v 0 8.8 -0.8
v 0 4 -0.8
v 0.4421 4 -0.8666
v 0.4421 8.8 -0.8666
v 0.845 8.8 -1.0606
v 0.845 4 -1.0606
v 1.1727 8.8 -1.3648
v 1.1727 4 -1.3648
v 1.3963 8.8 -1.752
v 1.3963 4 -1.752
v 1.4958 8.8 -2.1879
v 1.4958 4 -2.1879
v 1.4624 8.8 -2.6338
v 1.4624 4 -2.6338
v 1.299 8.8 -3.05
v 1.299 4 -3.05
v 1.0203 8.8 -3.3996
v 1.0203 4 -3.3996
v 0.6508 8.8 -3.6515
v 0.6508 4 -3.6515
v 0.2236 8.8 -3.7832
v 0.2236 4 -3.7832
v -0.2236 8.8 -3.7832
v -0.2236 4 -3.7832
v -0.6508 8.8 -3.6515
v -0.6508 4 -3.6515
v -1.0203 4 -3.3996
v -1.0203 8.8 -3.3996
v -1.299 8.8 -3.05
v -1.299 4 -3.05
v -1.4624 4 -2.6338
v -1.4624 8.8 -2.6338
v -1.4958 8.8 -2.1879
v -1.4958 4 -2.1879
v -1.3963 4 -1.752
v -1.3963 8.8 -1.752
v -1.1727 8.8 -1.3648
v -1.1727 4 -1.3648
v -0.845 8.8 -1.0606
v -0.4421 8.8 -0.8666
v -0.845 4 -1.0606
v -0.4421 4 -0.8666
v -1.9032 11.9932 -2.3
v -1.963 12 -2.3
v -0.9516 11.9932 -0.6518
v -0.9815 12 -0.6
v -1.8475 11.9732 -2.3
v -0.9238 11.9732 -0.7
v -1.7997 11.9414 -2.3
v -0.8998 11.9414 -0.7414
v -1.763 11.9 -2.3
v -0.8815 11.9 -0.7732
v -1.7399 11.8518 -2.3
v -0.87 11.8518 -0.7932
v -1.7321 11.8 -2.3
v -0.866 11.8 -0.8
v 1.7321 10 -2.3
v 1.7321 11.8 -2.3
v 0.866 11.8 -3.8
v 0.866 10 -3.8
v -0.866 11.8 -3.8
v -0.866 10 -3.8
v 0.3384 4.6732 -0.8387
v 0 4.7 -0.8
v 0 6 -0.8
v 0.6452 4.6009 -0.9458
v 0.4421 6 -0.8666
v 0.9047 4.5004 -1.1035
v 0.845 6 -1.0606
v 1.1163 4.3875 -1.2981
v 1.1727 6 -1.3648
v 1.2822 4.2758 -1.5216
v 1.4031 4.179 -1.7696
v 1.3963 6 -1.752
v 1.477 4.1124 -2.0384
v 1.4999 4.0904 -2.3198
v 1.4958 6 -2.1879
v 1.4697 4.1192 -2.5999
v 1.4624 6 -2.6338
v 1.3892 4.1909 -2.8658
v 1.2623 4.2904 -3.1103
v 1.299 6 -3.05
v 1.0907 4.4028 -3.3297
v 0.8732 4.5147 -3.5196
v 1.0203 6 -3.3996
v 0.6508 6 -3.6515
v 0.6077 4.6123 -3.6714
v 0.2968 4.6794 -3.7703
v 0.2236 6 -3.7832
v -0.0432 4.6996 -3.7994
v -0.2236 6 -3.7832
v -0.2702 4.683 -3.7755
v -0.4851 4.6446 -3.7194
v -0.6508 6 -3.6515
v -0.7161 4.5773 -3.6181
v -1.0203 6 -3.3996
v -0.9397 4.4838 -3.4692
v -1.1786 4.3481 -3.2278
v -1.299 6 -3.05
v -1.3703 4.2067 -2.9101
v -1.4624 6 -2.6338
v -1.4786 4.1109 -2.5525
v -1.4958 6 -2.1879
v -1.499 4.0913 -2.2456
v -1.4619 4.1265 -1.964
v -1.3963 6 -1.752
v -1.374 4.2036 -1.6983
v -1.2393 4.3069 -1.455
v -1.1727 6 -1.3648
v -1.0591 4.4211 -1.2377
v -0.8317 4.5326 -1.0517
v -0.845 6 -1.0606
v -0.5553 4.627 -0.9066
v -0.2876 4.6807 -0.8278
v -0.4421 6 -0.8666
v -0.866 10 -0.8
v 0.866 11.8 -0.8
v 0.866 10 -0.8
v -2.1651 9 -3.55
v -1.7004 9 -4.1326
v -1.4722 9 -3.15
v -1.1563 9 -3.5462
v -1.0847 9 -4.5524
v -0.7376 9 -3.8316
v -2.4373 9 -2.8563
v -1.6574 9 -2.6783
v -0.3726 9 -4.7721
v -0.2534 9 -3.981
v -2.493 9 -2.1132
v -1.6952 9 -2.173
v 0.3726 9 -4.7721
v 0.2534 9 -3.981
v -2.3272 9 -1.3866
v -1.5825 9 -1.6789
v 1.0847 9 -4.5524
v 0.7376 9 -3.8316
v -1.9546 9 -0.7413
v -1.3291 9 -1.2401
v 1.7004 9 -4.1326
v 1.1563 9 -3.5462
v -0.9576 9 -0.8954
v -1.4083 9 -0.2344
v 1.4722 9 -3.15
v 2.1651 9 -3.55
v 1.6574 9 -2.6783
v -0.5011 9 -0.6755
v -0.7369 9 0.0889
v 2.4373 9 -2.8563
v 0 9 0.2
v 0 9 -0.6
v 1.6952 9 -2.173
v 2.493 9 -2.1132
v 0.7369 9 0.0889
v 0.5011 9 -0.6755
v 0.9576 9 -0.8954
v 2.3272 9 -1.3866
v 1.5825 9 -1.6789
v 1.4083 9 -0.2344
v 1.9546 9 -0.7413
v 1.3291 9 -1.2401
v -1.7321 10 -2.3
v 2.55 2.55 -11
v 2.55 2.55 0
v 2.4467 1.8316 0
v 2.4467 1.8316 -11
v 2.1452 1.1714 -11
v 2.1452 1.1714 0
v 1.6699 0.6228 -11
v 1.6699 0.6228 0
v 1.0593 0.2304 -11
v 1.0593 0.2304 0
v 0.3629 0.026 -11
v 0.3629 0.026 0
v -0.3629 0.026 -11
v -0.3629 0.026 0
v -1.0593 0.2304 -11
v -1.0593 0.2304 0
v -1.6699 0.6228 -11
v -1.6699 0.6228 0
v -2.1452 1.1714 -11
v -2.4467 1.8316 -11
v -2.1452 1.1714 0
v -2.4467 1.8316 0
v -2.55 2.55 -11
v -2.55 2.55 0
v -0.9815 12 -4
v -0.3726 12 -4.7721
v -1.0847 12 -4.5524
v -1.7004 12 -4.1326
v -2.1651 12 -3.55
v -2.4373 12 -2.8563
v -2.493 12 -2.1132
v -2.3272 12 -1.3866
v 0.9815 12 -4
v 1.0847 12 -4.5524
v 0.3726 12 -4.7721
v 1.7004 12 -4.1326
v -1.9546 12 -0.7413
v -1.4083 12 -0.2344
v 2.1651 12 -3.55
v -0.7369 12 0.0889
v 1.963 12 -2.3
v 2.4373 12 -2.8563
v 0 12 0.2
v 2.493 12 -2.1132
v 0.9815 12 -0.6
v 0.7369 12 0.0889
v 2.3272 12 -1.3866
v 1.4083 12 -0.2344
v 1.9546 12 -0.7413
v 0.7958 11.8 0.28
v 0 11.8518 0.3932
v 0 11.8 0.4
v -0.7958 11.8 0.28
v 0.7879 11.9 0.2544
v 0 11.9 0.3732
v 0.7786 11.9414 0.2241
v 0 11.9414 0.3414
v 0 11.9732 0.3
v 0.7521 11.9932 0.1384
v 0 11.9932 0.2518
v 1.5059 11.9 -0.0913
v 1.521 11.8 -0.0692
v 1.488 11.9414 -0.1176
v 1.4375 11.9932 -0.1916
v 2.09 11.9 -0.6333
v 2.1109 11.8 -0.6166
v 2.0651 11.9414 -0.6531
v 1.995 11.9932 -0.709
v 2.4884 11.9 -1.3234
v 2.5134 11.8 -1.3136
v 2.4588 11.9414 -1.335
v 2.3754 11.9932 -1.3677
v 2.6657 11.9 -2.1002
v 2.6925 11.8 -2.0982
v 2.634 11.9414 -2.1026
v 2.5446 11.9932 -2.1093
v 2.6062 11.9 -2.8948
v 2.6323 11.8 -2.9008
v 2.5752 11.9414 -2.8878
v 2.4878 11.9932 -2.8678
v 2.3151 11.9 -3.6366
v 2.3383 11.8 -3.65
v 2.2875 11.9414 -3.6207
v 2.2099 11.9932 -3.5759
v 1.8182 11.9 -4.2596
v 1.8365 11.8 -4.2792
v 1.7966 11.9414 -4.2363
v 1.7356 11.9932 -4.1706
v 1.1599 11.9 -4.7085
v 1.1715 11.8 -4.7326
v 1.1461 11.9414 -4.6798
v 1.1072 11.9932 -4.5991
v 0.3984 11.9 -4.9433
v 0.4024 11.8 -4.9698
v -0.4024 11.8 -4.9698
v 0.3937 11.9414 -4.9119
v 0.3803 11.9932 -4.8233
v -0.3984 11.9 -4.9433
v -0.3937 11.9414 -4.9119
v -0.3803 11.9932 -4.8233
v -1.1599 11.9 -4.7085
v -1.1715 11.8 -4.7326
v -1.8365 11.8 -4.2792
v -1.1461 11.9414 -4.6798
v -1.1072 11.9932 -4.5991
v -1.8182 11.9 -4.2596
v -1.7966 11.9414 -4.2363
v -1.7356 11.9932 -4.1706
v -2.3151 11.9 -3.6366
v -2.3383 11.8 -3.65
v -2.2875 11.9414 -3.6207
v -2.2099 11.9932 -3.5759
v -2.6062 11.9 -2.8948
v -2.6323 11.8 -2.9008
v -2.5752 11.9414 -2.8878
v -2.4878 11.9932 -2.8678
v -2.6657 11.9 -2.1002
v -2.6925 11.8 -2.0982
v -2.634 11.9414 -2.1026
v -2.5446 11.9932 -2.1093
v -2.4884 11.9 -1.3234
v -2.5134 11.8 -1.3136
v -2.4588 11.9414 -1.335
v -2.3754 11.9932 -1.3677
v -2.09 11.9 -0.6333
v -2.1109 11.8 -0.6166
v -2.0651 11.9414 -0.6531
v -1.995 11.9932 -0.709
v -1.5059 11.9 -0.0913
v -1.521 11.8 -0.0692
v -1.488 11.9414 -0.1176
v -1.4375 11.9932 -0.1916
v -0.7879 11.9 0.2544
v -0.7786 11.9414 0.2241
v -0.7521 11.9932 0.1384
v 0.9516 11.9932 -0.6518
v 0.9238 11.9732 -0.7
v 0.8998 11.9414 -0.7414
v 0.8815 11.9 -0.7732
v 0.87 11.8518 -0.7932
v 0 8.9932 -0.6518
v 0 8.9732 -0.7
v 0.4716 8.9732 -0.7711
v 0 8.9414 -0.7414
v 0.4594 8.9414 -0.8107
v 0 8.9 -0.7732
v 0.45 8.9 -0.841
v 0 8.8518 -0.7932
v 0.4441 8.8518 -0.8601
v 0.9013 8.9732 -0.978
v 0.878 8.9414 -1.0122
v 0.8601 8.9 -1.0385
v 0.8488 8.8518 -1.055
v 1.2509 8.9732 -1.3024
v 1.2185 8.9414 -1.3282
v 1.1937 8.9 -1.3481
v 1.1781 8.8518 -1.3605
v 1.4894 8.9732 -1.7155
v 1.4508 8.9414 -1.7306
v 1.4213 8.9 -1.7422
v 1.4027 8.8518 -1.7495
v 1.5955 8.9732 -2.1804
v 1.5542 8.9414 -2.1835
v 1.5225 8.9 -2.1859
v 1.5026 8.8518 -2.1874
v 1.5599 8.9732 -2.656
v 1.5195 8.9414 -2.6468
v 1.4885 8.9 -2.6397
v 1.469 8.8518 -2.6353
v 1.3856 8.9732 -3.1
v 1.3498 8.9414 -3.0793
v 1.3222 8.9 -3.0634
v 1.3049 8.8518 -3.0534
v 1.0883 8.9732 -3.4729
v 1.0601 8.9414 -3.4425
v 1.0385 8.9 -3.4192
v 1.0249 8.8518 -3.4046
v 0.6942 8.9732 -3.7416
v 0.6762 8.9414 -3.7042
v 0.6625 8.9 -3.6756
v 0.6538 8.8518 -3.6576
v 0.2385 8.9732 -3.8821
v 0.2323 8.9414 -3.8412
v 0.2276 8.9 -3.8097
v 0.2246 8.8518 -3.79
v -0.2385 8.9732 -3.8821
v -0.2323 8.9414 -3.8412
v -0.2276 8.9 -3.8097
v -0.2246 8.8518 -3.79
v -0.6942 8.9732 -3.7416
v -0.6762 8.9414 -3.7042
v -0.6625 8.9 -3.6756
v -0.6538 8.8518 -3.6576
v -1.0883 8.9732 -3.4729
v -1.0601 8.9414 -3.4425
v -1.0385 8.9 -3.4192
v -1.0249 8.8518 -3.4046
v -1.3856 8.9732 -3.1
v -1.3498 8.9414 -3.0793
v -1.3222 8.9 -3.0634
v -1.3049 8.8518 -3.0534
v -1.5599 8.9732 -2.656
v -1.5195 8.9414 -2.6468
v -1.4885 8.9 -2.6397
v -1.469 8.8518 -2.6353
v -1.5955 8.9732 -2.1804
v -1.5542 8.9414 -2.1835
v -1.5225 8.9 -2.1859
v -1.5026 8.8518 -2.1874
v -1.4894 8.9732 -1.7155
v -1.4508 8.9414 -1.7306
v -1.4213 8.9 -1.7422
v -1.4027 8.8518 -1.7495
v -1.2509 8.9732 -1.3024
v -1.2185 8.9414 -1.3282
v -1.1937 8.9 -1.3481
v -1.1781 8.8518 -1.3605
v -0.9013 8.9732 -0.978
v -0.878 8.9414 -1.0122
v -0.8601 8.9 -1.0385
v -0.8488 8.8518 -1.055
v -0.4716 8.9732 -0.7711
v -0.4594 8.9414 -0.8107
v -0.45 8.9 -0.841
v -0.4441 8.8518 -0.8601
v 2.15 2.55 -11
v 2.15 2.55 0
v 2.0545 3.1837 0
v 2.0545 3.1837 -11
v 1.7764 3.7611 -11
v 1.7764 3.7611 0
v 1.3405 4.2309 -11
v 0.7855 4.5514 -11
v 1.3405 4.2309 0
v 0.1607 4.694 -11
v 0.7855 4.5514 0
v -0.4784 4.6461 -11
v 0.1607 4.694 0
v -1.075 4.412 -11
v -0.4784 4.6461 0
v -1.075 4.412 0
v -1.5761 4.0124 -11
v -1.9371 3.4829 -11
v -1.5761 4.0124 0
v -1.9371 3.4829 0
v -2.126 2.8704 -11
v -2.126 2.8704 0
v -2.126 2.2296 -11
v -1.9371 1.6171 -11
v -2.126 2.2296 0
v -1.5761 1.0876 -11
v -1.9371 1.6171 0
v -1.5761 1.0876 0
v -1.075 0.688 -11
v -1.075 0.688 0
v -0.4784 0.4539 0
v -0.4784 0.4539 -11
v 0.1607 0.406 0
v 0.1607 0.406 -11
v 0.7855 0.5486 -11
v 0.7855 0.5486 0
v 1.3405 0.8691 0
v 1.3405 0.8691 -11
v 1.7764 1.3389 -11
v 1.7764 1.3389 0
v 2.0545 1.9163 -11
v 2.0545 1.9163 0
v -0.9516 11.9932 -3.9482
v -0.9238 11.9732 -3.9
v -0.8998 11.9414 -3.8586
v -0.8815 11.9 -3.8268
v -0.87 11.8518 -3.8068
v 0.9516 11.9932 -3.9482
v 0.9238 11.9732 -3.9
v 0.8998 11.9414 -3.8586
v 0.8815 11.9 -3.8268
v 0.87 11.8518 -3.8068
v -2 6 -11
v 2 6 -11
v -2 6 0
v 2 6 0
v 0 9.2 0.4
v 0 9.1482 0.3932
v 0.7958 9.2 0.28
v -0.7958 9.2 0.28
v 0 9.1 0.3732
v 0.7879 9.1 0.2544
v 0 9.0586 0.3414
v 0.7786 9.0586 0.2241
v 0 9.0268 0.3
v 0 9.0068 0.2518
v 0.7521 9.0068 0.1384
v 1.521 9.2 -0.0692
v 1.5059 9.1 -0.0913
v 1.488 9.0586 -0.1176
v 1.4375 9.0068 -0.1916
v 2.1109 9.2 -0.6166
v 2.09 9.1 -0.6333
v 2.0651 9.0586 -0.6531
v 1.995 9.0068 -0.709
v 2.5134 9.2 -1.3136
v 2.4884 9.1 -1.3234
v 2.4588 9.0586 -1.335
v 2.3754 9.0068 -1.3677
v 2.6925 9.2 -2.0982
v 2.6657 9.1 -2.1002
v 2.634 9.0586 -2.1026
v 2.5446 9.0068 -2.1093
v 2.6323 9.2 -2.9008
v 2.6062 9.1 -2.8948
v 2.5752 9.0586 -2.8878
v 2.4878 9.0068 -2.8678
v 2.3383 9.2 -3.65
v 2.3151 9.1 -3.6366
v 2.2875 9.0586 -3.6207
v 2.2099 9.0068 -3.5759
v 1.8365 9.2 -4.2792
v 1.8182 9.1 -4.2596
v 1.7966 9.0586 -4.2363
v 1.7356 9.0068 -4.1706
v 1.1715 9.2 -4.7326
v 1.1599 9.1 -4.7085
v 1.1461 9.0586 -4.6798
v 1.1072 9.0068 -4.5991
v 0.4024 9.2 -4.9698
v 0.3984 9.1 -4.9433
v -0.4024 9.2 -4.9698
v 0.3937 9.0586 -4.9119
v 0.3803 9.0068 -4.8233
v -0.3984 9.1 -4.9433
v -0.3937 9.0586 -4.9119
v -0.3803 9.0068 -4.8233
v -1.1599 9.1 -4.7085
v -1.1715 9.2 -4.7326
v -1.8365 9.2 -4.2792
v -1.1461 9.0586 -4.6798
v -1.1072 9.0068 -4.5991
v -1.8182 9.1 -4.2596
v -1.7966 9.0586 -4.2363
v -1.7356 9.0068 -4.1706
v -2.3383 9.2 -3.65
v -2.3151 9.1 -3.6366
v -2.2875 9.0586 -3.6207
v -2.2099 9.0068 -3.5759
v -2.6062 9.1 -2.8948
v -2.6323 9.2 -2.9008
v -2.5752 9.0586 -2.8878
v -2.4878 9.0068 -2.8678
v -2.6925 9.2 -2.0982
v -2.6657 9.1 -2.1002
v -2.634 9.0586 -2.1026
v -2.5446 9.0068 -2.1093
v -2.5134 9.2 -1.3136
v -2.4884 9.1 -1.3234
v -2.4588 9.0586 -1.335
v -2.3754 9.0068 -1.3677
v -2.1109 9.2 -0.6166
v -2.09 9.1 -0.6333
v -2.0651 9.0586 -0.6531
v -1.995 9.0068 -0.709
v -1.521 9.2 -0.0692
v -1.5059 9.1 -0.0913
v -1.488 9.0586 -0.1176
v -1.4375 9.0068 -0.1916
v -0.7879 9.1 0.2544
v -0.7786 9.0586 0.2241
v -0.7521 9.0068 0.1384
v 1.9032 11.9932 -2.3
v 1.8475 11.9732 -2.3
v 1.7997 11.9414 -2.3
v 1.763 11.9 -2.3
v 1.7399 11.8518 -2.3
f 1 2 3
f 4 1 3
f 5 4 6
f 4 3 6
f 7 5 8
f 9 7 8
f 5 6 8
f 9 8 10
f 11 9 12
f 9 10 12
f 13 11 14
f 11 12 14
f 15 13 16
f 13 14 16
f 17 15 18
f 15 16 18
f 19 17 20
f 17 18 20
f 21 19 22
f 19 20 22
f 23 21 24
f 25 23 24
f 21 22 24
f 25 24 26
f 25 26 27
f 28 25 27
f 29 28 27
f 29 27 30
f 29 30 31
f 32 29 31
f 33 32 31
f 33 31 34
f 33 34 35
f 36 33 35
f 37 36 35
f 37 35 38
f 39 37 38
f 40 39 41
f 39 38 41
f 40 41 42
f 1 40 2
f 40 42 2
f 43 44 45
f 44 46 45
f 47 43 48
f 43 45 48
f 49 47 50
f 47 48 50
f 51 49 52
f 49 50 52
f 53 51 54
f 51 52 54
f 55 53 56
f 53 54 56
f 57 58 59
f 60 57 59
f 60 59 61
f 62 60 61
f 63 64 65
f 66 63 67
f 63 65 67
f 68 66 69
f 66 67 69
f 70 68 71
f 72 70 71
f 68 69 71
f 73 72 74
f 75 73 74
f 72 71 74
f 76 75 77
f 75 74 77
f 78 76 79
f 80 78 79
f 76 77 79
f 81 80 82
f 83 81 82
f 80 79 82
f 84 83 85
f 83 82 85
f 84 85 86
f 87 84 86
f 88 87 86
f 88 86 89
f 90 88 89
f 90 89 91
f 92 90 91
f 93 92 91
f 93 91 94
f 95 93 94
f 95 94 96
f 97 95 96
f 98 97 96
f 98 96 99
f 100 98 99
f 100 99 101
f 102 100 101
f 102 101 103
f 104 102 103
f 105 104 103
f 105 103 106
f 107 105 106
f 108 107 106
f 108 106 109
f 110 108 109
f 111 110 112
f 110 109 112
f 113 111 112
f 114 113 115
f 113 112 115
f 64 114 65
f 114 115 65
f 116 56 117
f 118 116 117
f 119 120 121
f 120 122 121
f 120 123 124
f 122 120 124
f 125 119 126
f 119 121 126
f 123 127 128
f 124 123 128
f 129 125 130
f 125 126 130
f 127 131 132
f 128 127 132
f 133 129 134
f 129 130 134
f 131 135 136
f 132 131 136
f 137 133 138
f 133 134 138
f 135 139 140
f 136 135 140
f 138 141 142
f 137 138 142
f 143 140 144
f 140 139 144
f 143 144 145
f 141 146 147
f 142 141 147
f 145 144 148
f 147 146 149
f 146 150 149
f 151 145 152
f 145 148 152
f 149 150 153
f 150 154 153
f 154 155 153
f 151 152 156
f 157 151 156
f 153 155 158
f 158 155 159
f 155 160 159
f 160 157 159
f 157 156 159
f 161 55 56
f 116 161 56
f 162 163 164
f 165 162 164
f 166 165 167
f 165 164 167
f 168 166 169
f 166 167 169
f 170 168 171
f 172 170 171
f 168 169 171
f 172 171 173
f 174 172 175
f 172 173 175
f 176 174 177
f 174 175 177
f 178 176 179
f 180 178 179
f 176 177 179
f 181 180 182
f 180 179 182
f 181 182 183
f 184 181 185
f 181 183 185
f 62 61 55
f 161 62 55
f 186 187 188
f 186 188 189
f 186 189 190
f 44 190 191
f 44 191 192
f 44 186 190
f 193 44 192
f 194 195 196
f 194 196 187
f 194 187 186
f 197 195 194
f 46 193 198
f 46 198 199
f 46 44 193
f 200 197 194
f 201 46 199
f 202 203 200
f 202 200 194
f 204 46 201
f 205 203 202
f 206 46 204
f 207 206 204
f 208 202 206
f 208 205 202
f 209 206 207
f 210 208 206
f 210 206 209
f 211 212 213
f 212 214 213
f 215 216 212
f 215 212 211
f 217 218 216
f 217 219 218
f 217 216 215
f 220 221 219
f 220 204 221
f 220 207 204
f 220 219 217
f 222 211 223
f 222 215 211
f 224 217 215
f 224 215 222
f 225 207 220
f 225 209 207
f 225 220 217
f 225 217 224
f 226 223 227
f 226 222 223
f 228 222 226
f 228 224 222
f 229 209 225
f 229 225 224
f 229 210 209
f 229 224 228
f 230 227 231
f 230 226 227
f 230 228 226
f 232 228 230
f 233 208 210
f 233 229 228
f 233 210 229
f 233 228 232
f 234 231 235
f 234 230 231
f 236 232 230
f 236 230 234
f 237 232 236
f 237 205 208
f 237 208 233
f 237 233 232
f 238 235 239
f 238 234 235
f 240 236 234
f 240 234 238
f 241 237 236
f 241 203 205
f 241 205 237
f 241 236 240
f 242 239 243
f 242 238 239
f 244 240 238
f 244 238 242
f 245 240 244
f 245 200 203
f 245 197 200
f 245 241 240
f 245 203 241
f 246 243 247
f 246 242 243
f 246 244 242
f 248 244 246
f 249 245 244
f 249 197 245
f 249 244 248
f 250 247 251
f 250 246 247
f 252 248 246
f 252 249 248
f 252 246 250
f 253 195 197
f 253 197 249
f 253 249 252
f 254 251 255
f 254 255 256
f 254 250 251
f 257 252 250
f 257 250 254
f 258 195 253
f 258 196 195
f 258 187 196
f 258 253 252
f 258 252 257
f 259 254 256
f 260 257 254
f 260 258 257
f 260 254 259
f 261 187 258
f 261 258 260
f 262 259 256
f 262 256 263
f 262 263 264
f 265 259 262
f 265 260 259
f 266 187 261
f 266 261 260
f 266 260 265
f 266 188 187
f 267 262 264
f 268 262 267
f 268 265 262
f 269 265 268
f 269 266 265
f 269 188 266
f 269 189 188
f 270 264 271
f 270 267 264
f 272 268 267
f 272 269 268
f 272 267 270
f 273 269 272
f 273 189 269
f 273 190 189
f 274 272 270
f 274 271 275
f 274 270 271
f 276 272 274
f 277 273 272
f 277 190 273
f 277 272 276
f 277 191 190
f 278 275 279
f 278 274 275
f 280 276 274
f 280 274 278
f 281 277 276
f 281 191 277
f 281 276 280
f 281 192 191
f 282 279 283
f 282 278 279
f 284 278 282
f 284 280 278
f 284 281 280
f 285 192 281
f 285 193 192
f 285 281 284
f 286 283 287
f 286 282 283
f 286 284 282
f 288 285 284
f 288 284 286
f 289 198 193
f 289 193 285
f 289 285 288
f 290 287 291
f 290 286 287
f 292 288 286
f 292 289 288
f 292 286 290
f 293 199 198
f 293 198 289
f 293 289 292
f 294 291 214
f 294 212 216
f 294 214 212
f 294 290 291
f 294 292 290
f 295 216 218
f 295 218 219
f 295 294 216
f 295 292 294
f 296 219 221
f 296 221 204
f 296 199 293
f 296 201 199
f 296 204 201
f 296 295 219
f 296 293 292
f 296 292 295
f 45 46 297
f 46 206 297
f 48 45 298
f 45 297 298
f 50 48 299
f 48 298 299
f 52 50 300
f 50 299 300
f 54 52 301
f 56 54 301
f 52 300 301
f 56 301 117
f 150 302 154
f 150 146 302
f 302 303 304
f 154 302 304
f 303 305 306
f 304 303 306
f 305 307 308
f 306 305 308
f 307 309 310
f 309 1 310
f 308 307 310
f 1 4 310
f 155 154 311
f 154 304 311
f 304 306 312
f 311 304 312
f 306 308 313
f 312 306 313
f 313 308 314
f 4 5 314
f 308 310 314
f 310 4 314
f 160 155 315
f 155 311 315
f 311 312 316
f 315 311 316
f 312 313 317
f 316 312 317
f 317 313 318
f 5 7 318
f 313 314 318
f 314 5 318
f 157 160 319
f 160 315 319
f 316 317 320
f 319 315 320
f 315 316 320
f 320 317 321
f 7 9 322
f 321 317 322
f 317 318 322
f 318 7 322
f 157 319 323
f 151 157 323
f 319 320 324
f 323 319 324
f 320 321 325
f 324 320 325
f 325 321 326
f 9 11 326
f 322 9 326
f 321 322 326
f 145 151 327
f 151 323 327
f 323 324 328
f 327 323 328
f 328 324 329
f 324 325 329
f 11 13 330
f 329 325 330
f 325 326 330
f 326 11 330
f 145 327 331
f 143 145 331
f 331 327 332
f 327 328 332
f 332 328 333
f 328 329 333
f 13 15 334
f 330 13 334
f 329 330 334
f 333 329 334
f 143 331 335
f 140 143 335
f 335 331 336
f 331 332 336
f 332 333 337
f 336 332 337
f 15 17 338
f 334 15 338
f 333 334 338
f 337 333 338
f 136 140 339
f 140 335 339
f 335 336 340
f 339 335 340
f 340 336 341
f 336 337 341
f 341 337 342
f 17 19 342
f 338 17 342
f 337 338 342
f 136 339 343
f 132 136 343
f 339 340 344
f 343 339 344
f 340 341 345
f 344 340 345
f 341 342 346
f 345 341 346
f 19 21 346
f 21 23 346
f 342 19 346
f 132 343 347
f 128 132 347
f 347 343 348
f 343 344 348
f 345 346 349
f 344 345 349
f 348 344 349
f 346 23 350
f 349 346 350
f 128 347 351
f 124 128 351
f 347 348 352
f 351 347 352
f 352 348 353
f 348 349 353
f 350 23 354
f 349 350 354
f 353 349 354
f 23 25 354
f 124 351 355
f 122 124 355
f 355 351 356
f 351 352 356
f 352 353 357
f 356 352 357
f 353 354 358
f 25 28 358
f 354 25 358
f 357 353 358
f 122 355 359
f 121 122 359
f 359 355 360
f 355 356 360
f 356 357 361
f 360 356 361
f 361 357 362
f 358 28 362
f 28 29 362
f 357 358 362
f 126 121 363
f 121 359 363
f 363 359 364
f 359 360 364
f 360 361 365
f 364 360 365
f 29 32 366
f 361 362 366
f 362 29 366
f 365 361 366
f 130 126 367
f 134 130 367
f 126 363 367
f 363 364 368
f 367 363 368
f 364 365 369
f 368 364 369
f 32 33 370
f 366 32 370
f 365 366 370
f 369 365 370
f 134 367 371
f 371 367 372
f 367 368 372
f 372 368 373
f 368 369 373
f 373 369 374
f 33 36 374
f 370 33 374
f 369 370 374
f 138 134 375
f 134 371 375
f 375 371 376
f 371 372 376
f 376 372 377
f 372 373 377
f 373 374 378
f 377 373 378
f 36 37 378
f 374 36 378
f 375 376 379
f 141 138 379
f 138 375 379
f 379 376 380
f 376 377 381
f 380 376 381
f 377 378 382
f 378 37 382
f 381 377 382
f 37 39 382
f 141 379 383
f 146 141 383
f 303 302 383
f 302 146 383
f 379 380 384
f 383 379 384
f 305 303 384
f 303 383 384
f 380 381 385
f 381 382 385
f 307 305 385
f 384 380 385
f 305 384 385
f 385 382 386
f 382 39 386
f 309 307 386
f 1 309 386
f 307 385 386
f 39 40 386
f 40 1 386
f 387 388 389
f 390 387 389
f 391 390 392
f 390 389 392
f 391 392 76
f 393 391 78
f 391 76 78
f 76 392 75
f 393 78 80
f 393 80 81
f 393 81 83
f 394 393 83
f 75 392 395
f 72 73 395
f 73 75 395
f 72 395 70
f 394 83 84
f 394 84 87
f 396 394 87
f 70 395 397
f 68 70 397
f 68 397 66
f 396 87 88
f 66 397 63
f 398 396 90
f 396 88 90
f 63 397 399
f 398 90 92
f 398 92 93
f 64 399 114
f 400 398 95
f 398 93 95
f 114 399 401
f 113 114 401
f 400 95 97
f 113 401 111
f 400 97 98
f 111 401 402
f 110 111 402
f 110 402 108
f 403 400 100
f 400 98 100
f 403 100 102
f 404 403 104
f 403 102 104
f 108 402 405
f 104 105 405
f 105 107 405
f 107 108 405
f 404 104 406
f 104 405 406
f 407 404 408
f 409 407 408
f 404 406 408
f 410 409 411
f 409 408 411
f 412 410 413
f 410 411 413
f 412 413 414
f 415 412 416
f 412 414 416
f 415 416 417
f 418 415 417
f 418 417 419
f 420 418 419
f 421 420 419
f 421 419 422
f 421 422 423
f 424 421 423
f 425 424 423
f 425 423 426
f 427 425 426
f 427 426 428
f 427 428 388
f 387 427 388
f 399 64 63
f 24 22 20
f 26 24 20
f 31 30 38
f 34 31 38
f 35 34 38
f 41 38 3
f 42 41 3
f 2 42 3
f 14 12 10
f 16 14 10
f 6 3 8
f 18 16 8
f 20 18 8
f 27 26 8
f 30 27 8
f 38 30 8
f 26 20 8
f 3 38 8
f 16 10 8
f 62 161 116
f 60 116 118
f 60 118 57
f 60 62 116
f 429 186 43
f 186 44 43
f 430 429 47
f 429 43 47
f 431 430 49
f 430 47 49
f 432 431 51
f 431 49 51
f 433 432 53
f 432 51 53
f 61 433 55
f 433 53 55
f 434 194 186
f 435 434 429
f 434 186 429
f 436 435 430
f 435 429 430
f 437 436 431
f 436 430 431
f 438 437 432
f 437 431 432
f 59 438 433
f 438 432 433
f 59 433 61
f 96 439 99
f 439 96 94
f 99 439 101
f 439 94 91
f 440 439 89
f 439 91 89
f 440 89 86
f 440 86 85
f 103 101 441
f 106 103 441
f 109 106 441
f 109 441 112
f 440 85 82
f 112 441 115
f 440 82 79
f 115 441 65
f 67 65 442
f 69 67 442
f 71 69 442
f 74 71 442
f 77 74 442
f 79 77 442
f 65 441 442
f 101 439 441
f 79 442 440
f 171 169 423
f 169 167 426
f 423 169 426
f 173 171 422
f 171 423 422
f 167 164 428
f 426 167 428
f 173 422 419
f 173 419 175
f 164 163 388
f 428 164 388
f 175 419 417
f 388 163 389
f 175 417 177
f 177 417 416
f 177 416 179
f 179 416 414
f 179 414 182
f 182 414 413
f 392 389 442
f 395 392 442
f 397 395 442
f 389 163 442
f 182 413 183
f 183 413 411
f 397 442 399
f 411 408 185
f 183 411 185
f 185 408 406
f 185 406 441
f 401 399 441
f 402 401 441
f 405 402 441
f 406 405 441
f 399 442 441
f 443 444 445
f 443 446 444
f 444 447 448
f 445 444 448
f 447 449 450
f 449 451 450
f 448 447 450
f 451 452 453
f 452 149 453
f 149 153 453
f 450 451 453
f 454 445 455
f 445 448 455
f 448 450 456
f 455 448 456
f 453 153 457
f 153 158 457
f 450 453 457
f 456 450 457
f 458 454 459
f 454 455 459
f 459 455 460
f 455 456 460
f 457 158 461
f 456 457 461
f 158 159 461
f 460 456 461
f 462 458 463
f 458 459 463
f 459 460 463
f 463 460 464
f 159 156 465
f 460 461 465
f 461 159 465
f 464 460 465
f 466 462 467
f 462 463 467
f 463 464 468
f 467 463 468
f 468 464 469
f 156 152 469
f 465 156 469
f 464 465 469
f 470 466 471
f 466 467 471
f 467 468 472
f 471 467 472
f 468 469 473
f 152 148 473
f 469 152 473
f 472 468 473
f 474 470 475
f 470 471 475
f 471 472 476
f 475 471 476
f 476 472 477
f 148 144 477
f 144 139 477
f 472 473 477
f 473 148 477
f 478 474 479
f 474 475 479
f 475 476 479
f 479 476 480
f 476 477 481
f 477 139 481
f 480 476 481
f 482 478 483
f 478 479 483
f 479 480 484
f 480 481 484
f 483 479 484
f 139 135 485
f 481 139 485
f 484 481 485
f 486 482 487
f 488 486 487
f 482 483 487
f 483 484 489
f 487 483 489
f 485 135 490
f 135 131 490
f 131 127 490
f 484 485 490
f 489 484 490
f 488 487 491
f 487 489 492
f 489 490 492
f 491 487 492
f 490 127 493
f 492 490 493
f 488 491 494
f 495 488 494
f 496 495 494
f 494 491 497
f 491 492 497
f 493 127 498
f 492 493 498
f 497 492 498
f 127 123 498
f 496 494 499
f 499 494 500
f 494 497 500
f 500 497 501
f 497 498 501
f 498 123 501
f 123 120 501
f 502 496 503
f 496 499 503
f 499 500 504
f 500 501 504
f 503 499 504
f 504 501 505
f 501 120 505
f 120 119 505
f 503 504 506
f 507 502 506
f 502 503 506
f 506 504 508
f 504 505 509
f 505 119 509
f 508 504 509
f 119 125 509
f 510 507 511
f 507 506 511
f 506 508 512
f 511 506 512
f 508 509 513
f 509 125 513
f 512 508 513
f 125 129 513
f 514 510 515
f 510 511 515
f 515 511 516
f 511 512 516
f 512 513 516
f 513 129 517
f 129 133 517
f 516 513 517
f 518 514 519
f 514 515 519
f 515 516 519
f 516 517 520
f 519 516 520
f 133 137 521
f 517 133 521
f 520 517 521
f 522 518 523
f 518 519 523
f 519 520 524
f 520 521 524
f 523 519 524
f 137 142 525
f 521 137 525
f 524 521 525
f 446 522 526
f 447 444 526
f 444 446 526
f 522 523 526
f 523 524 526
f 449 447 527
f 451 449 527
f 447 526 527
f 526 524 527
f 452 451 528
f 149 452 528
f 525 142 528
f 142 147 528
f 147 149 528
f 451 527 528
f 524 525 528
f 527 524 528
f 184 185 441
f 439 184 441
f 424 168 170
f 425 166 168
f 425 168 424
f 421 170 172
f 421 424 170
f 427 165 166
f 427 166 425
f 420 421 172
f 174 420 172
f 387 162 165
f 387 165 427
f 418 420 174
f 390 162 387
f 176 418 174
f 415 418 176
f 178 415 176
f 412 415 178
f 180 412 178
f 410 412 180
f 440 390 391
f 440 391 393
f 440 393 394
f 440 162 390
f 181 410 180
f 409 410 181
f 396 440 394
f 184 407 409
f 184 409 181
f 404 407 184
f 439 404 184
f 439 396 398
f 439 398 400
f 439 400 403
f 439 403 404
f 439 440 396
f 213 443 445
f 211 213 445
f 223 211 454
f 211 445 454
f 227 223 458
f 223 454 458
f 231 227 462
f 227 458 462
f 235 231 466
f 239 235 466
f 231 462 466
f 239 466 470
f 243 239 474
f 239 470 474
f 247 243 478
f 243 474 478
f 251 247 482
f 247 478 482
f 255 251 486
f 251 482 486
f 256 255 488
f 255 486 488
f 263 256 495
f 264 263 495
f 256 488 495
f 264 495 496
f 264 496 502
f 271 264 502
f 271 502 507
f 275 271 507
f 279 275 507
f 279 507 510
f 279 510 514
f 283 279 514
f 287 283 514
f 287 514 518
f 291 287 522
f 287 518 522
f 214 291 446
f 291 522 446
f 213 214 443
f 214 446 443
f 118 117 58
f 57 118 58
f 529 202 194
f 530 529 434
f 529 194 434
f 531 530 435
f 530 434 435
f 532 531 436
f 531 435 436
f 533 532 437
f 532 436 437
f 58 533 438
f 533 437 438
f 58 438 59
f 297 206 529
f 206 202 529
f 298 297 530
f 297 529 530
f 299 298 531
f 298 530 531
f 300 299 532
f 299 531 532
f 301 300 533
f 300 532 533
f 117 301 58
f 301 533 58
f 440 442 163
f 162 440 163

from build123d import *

# Parameters (mm, degrees)
SKETCH_1_R               = 2.15
EXTRUDE_1_DEPTH          = 11
CUT_EXTRUDE_1_REACH      = 14.787
CUT_EXTRUDE_1_END_RADIUS = 2.15
SKETCH_2_R               = 1.5
EXTRUDE_2_DEPTH          = 3
EXTRUDE_2_DEPTH_BACK     = 2
SKETCH_3_R               = 1.5
SKETCH_4_R               = 2.7
EXTRUDE_3_DEPTH          = 3
CUT_EXTRUDE_2_DEPTH      = 2
FILLET_1_R               = 0.2


with BuildPart() as part:
    # Эскиз1 → Бобышка-Вытянуть1 (new body)
    with BuildSketch(Plane.XY):
        with BuildLine():
            Line((-2, 6), (2, 6))
            Line((2, 6), (2.55, 2.55))
            ThreePointArc((2.55, 2.55), (0, 0), (-2.55, 2.55))
            Line((-2.55, 2.55), (-2, 6))
        make_face()
        with Locations((0, 2.55)):
            Circle(SKETCH_1_R, mode=Mode.SUBTRACT)
    extrude(amount=-EXTRUDE_1_DEPTH)

    # Вырез-Вытянуть1: up to this cylinder (the profile starts outside it)
    cut_extrude_1_end = Plane(origin=(0, 2.55, -2.3), z_dir=(0, 0, 1)) * Cylinder(CUT_EXTRUDE_1_END_RADIUS, 34.874, mode=Mode.PRIVATE)
    # Эскиз2 → Вырез-Вытянуть1 (cut, up to the surface)
    with BuildSketch(Plane(origin=(0, 6, 0), x_dir=(1, 0, 0), z_dir=(0, 1, 0)), mode=Mode.PRIVATE) as cut_extrude_1_sk1:
        with Locations(Location((0, 2.3, 0), (0, 0, 270))):
            Circle(SKETCH_2_R)
    cut_extrude_1_tool1 = extrude(cut_extrude_1_sk1.sketch, amount=-CUT_EXTRUDE_1_REACH, mode=Mode.PRIVATE) - cut_extrude_1_end
    add(cut_extrude_1_tool1.solids().sort_by_distance((0, 6, -2.3))[0], mode=Mode.SUBTRACT)


with BuildPart() as body_2:
    # Эскиз3 → Бобышка-Вытянуть2 (new, two sides: drawn at the far end of the back side and taken through both)
    with BuildSketch(Plane(origin=(0, 6, 0), x_dir=(1, 0, 0), z_dir=(0, 1, 0)).offset(-EXTRUDE_2_DEPTH_BACK)):
        with Locations(Location((0, 2.3, 0), (0, 0, 270))):
            Circle(SKETCH_3_R)
    extrude(amount=EXTRUDE_2_DEPTH + EXTRUDE_2_DEPTH_BACK)

    # Эскиз4 → Бобышка-Вытянуть3 (add)
    with BuildSketch(Plane(origin=(0, 9, 0), x_dir=(1, 0, 0), z_dir=(0, 1, 0))):
        with Locations(Location((0, 2.3, 0), (0, 0, 270))):
            Circle(SKETCH_4_R)
    extrude(amount=EXTRUDE_3_DEPTH)

    # Эскиз5 → Вырез-Вытянуть2 (cut)
    with BuildSketch(Plane(origin=(0, 12, 0), x_dir=(1, 0, 0), z_dir=(0, 1, 0))):
        Polygon((1.732050808, 2.3), (0.866025404, 3.8), (-0.866025404, 3.8), (-1.732050808, 2.3), (-0.866025404, 0.8), (0.866025404, 0.8), align=None)
    extrude(amount=-CUT_EXTRUDE_2_DEPTH, mode=Mode.SUBTRACT)

    # Скругление1
    fillet_1_edges = [body_2.edges().sort_by_distance(p)[0] for p in [
        (1.299038106, 12, -1.55),
        (1.299038106, 12, -3.05),
        (0, 12, -3.8),
        (-1.299038106, 12, -3.05),
        (-1.299038106, 12, -1.55),
        (0, 12, -0.8),
        (0, 9, -3.8),
        (0, 9, -5),
        (0, 12, -5),
    ]]
    fillet(fillet_1_edges, radius=FILLET_1_R)


solid = Compound([part.part, body_2.part])
